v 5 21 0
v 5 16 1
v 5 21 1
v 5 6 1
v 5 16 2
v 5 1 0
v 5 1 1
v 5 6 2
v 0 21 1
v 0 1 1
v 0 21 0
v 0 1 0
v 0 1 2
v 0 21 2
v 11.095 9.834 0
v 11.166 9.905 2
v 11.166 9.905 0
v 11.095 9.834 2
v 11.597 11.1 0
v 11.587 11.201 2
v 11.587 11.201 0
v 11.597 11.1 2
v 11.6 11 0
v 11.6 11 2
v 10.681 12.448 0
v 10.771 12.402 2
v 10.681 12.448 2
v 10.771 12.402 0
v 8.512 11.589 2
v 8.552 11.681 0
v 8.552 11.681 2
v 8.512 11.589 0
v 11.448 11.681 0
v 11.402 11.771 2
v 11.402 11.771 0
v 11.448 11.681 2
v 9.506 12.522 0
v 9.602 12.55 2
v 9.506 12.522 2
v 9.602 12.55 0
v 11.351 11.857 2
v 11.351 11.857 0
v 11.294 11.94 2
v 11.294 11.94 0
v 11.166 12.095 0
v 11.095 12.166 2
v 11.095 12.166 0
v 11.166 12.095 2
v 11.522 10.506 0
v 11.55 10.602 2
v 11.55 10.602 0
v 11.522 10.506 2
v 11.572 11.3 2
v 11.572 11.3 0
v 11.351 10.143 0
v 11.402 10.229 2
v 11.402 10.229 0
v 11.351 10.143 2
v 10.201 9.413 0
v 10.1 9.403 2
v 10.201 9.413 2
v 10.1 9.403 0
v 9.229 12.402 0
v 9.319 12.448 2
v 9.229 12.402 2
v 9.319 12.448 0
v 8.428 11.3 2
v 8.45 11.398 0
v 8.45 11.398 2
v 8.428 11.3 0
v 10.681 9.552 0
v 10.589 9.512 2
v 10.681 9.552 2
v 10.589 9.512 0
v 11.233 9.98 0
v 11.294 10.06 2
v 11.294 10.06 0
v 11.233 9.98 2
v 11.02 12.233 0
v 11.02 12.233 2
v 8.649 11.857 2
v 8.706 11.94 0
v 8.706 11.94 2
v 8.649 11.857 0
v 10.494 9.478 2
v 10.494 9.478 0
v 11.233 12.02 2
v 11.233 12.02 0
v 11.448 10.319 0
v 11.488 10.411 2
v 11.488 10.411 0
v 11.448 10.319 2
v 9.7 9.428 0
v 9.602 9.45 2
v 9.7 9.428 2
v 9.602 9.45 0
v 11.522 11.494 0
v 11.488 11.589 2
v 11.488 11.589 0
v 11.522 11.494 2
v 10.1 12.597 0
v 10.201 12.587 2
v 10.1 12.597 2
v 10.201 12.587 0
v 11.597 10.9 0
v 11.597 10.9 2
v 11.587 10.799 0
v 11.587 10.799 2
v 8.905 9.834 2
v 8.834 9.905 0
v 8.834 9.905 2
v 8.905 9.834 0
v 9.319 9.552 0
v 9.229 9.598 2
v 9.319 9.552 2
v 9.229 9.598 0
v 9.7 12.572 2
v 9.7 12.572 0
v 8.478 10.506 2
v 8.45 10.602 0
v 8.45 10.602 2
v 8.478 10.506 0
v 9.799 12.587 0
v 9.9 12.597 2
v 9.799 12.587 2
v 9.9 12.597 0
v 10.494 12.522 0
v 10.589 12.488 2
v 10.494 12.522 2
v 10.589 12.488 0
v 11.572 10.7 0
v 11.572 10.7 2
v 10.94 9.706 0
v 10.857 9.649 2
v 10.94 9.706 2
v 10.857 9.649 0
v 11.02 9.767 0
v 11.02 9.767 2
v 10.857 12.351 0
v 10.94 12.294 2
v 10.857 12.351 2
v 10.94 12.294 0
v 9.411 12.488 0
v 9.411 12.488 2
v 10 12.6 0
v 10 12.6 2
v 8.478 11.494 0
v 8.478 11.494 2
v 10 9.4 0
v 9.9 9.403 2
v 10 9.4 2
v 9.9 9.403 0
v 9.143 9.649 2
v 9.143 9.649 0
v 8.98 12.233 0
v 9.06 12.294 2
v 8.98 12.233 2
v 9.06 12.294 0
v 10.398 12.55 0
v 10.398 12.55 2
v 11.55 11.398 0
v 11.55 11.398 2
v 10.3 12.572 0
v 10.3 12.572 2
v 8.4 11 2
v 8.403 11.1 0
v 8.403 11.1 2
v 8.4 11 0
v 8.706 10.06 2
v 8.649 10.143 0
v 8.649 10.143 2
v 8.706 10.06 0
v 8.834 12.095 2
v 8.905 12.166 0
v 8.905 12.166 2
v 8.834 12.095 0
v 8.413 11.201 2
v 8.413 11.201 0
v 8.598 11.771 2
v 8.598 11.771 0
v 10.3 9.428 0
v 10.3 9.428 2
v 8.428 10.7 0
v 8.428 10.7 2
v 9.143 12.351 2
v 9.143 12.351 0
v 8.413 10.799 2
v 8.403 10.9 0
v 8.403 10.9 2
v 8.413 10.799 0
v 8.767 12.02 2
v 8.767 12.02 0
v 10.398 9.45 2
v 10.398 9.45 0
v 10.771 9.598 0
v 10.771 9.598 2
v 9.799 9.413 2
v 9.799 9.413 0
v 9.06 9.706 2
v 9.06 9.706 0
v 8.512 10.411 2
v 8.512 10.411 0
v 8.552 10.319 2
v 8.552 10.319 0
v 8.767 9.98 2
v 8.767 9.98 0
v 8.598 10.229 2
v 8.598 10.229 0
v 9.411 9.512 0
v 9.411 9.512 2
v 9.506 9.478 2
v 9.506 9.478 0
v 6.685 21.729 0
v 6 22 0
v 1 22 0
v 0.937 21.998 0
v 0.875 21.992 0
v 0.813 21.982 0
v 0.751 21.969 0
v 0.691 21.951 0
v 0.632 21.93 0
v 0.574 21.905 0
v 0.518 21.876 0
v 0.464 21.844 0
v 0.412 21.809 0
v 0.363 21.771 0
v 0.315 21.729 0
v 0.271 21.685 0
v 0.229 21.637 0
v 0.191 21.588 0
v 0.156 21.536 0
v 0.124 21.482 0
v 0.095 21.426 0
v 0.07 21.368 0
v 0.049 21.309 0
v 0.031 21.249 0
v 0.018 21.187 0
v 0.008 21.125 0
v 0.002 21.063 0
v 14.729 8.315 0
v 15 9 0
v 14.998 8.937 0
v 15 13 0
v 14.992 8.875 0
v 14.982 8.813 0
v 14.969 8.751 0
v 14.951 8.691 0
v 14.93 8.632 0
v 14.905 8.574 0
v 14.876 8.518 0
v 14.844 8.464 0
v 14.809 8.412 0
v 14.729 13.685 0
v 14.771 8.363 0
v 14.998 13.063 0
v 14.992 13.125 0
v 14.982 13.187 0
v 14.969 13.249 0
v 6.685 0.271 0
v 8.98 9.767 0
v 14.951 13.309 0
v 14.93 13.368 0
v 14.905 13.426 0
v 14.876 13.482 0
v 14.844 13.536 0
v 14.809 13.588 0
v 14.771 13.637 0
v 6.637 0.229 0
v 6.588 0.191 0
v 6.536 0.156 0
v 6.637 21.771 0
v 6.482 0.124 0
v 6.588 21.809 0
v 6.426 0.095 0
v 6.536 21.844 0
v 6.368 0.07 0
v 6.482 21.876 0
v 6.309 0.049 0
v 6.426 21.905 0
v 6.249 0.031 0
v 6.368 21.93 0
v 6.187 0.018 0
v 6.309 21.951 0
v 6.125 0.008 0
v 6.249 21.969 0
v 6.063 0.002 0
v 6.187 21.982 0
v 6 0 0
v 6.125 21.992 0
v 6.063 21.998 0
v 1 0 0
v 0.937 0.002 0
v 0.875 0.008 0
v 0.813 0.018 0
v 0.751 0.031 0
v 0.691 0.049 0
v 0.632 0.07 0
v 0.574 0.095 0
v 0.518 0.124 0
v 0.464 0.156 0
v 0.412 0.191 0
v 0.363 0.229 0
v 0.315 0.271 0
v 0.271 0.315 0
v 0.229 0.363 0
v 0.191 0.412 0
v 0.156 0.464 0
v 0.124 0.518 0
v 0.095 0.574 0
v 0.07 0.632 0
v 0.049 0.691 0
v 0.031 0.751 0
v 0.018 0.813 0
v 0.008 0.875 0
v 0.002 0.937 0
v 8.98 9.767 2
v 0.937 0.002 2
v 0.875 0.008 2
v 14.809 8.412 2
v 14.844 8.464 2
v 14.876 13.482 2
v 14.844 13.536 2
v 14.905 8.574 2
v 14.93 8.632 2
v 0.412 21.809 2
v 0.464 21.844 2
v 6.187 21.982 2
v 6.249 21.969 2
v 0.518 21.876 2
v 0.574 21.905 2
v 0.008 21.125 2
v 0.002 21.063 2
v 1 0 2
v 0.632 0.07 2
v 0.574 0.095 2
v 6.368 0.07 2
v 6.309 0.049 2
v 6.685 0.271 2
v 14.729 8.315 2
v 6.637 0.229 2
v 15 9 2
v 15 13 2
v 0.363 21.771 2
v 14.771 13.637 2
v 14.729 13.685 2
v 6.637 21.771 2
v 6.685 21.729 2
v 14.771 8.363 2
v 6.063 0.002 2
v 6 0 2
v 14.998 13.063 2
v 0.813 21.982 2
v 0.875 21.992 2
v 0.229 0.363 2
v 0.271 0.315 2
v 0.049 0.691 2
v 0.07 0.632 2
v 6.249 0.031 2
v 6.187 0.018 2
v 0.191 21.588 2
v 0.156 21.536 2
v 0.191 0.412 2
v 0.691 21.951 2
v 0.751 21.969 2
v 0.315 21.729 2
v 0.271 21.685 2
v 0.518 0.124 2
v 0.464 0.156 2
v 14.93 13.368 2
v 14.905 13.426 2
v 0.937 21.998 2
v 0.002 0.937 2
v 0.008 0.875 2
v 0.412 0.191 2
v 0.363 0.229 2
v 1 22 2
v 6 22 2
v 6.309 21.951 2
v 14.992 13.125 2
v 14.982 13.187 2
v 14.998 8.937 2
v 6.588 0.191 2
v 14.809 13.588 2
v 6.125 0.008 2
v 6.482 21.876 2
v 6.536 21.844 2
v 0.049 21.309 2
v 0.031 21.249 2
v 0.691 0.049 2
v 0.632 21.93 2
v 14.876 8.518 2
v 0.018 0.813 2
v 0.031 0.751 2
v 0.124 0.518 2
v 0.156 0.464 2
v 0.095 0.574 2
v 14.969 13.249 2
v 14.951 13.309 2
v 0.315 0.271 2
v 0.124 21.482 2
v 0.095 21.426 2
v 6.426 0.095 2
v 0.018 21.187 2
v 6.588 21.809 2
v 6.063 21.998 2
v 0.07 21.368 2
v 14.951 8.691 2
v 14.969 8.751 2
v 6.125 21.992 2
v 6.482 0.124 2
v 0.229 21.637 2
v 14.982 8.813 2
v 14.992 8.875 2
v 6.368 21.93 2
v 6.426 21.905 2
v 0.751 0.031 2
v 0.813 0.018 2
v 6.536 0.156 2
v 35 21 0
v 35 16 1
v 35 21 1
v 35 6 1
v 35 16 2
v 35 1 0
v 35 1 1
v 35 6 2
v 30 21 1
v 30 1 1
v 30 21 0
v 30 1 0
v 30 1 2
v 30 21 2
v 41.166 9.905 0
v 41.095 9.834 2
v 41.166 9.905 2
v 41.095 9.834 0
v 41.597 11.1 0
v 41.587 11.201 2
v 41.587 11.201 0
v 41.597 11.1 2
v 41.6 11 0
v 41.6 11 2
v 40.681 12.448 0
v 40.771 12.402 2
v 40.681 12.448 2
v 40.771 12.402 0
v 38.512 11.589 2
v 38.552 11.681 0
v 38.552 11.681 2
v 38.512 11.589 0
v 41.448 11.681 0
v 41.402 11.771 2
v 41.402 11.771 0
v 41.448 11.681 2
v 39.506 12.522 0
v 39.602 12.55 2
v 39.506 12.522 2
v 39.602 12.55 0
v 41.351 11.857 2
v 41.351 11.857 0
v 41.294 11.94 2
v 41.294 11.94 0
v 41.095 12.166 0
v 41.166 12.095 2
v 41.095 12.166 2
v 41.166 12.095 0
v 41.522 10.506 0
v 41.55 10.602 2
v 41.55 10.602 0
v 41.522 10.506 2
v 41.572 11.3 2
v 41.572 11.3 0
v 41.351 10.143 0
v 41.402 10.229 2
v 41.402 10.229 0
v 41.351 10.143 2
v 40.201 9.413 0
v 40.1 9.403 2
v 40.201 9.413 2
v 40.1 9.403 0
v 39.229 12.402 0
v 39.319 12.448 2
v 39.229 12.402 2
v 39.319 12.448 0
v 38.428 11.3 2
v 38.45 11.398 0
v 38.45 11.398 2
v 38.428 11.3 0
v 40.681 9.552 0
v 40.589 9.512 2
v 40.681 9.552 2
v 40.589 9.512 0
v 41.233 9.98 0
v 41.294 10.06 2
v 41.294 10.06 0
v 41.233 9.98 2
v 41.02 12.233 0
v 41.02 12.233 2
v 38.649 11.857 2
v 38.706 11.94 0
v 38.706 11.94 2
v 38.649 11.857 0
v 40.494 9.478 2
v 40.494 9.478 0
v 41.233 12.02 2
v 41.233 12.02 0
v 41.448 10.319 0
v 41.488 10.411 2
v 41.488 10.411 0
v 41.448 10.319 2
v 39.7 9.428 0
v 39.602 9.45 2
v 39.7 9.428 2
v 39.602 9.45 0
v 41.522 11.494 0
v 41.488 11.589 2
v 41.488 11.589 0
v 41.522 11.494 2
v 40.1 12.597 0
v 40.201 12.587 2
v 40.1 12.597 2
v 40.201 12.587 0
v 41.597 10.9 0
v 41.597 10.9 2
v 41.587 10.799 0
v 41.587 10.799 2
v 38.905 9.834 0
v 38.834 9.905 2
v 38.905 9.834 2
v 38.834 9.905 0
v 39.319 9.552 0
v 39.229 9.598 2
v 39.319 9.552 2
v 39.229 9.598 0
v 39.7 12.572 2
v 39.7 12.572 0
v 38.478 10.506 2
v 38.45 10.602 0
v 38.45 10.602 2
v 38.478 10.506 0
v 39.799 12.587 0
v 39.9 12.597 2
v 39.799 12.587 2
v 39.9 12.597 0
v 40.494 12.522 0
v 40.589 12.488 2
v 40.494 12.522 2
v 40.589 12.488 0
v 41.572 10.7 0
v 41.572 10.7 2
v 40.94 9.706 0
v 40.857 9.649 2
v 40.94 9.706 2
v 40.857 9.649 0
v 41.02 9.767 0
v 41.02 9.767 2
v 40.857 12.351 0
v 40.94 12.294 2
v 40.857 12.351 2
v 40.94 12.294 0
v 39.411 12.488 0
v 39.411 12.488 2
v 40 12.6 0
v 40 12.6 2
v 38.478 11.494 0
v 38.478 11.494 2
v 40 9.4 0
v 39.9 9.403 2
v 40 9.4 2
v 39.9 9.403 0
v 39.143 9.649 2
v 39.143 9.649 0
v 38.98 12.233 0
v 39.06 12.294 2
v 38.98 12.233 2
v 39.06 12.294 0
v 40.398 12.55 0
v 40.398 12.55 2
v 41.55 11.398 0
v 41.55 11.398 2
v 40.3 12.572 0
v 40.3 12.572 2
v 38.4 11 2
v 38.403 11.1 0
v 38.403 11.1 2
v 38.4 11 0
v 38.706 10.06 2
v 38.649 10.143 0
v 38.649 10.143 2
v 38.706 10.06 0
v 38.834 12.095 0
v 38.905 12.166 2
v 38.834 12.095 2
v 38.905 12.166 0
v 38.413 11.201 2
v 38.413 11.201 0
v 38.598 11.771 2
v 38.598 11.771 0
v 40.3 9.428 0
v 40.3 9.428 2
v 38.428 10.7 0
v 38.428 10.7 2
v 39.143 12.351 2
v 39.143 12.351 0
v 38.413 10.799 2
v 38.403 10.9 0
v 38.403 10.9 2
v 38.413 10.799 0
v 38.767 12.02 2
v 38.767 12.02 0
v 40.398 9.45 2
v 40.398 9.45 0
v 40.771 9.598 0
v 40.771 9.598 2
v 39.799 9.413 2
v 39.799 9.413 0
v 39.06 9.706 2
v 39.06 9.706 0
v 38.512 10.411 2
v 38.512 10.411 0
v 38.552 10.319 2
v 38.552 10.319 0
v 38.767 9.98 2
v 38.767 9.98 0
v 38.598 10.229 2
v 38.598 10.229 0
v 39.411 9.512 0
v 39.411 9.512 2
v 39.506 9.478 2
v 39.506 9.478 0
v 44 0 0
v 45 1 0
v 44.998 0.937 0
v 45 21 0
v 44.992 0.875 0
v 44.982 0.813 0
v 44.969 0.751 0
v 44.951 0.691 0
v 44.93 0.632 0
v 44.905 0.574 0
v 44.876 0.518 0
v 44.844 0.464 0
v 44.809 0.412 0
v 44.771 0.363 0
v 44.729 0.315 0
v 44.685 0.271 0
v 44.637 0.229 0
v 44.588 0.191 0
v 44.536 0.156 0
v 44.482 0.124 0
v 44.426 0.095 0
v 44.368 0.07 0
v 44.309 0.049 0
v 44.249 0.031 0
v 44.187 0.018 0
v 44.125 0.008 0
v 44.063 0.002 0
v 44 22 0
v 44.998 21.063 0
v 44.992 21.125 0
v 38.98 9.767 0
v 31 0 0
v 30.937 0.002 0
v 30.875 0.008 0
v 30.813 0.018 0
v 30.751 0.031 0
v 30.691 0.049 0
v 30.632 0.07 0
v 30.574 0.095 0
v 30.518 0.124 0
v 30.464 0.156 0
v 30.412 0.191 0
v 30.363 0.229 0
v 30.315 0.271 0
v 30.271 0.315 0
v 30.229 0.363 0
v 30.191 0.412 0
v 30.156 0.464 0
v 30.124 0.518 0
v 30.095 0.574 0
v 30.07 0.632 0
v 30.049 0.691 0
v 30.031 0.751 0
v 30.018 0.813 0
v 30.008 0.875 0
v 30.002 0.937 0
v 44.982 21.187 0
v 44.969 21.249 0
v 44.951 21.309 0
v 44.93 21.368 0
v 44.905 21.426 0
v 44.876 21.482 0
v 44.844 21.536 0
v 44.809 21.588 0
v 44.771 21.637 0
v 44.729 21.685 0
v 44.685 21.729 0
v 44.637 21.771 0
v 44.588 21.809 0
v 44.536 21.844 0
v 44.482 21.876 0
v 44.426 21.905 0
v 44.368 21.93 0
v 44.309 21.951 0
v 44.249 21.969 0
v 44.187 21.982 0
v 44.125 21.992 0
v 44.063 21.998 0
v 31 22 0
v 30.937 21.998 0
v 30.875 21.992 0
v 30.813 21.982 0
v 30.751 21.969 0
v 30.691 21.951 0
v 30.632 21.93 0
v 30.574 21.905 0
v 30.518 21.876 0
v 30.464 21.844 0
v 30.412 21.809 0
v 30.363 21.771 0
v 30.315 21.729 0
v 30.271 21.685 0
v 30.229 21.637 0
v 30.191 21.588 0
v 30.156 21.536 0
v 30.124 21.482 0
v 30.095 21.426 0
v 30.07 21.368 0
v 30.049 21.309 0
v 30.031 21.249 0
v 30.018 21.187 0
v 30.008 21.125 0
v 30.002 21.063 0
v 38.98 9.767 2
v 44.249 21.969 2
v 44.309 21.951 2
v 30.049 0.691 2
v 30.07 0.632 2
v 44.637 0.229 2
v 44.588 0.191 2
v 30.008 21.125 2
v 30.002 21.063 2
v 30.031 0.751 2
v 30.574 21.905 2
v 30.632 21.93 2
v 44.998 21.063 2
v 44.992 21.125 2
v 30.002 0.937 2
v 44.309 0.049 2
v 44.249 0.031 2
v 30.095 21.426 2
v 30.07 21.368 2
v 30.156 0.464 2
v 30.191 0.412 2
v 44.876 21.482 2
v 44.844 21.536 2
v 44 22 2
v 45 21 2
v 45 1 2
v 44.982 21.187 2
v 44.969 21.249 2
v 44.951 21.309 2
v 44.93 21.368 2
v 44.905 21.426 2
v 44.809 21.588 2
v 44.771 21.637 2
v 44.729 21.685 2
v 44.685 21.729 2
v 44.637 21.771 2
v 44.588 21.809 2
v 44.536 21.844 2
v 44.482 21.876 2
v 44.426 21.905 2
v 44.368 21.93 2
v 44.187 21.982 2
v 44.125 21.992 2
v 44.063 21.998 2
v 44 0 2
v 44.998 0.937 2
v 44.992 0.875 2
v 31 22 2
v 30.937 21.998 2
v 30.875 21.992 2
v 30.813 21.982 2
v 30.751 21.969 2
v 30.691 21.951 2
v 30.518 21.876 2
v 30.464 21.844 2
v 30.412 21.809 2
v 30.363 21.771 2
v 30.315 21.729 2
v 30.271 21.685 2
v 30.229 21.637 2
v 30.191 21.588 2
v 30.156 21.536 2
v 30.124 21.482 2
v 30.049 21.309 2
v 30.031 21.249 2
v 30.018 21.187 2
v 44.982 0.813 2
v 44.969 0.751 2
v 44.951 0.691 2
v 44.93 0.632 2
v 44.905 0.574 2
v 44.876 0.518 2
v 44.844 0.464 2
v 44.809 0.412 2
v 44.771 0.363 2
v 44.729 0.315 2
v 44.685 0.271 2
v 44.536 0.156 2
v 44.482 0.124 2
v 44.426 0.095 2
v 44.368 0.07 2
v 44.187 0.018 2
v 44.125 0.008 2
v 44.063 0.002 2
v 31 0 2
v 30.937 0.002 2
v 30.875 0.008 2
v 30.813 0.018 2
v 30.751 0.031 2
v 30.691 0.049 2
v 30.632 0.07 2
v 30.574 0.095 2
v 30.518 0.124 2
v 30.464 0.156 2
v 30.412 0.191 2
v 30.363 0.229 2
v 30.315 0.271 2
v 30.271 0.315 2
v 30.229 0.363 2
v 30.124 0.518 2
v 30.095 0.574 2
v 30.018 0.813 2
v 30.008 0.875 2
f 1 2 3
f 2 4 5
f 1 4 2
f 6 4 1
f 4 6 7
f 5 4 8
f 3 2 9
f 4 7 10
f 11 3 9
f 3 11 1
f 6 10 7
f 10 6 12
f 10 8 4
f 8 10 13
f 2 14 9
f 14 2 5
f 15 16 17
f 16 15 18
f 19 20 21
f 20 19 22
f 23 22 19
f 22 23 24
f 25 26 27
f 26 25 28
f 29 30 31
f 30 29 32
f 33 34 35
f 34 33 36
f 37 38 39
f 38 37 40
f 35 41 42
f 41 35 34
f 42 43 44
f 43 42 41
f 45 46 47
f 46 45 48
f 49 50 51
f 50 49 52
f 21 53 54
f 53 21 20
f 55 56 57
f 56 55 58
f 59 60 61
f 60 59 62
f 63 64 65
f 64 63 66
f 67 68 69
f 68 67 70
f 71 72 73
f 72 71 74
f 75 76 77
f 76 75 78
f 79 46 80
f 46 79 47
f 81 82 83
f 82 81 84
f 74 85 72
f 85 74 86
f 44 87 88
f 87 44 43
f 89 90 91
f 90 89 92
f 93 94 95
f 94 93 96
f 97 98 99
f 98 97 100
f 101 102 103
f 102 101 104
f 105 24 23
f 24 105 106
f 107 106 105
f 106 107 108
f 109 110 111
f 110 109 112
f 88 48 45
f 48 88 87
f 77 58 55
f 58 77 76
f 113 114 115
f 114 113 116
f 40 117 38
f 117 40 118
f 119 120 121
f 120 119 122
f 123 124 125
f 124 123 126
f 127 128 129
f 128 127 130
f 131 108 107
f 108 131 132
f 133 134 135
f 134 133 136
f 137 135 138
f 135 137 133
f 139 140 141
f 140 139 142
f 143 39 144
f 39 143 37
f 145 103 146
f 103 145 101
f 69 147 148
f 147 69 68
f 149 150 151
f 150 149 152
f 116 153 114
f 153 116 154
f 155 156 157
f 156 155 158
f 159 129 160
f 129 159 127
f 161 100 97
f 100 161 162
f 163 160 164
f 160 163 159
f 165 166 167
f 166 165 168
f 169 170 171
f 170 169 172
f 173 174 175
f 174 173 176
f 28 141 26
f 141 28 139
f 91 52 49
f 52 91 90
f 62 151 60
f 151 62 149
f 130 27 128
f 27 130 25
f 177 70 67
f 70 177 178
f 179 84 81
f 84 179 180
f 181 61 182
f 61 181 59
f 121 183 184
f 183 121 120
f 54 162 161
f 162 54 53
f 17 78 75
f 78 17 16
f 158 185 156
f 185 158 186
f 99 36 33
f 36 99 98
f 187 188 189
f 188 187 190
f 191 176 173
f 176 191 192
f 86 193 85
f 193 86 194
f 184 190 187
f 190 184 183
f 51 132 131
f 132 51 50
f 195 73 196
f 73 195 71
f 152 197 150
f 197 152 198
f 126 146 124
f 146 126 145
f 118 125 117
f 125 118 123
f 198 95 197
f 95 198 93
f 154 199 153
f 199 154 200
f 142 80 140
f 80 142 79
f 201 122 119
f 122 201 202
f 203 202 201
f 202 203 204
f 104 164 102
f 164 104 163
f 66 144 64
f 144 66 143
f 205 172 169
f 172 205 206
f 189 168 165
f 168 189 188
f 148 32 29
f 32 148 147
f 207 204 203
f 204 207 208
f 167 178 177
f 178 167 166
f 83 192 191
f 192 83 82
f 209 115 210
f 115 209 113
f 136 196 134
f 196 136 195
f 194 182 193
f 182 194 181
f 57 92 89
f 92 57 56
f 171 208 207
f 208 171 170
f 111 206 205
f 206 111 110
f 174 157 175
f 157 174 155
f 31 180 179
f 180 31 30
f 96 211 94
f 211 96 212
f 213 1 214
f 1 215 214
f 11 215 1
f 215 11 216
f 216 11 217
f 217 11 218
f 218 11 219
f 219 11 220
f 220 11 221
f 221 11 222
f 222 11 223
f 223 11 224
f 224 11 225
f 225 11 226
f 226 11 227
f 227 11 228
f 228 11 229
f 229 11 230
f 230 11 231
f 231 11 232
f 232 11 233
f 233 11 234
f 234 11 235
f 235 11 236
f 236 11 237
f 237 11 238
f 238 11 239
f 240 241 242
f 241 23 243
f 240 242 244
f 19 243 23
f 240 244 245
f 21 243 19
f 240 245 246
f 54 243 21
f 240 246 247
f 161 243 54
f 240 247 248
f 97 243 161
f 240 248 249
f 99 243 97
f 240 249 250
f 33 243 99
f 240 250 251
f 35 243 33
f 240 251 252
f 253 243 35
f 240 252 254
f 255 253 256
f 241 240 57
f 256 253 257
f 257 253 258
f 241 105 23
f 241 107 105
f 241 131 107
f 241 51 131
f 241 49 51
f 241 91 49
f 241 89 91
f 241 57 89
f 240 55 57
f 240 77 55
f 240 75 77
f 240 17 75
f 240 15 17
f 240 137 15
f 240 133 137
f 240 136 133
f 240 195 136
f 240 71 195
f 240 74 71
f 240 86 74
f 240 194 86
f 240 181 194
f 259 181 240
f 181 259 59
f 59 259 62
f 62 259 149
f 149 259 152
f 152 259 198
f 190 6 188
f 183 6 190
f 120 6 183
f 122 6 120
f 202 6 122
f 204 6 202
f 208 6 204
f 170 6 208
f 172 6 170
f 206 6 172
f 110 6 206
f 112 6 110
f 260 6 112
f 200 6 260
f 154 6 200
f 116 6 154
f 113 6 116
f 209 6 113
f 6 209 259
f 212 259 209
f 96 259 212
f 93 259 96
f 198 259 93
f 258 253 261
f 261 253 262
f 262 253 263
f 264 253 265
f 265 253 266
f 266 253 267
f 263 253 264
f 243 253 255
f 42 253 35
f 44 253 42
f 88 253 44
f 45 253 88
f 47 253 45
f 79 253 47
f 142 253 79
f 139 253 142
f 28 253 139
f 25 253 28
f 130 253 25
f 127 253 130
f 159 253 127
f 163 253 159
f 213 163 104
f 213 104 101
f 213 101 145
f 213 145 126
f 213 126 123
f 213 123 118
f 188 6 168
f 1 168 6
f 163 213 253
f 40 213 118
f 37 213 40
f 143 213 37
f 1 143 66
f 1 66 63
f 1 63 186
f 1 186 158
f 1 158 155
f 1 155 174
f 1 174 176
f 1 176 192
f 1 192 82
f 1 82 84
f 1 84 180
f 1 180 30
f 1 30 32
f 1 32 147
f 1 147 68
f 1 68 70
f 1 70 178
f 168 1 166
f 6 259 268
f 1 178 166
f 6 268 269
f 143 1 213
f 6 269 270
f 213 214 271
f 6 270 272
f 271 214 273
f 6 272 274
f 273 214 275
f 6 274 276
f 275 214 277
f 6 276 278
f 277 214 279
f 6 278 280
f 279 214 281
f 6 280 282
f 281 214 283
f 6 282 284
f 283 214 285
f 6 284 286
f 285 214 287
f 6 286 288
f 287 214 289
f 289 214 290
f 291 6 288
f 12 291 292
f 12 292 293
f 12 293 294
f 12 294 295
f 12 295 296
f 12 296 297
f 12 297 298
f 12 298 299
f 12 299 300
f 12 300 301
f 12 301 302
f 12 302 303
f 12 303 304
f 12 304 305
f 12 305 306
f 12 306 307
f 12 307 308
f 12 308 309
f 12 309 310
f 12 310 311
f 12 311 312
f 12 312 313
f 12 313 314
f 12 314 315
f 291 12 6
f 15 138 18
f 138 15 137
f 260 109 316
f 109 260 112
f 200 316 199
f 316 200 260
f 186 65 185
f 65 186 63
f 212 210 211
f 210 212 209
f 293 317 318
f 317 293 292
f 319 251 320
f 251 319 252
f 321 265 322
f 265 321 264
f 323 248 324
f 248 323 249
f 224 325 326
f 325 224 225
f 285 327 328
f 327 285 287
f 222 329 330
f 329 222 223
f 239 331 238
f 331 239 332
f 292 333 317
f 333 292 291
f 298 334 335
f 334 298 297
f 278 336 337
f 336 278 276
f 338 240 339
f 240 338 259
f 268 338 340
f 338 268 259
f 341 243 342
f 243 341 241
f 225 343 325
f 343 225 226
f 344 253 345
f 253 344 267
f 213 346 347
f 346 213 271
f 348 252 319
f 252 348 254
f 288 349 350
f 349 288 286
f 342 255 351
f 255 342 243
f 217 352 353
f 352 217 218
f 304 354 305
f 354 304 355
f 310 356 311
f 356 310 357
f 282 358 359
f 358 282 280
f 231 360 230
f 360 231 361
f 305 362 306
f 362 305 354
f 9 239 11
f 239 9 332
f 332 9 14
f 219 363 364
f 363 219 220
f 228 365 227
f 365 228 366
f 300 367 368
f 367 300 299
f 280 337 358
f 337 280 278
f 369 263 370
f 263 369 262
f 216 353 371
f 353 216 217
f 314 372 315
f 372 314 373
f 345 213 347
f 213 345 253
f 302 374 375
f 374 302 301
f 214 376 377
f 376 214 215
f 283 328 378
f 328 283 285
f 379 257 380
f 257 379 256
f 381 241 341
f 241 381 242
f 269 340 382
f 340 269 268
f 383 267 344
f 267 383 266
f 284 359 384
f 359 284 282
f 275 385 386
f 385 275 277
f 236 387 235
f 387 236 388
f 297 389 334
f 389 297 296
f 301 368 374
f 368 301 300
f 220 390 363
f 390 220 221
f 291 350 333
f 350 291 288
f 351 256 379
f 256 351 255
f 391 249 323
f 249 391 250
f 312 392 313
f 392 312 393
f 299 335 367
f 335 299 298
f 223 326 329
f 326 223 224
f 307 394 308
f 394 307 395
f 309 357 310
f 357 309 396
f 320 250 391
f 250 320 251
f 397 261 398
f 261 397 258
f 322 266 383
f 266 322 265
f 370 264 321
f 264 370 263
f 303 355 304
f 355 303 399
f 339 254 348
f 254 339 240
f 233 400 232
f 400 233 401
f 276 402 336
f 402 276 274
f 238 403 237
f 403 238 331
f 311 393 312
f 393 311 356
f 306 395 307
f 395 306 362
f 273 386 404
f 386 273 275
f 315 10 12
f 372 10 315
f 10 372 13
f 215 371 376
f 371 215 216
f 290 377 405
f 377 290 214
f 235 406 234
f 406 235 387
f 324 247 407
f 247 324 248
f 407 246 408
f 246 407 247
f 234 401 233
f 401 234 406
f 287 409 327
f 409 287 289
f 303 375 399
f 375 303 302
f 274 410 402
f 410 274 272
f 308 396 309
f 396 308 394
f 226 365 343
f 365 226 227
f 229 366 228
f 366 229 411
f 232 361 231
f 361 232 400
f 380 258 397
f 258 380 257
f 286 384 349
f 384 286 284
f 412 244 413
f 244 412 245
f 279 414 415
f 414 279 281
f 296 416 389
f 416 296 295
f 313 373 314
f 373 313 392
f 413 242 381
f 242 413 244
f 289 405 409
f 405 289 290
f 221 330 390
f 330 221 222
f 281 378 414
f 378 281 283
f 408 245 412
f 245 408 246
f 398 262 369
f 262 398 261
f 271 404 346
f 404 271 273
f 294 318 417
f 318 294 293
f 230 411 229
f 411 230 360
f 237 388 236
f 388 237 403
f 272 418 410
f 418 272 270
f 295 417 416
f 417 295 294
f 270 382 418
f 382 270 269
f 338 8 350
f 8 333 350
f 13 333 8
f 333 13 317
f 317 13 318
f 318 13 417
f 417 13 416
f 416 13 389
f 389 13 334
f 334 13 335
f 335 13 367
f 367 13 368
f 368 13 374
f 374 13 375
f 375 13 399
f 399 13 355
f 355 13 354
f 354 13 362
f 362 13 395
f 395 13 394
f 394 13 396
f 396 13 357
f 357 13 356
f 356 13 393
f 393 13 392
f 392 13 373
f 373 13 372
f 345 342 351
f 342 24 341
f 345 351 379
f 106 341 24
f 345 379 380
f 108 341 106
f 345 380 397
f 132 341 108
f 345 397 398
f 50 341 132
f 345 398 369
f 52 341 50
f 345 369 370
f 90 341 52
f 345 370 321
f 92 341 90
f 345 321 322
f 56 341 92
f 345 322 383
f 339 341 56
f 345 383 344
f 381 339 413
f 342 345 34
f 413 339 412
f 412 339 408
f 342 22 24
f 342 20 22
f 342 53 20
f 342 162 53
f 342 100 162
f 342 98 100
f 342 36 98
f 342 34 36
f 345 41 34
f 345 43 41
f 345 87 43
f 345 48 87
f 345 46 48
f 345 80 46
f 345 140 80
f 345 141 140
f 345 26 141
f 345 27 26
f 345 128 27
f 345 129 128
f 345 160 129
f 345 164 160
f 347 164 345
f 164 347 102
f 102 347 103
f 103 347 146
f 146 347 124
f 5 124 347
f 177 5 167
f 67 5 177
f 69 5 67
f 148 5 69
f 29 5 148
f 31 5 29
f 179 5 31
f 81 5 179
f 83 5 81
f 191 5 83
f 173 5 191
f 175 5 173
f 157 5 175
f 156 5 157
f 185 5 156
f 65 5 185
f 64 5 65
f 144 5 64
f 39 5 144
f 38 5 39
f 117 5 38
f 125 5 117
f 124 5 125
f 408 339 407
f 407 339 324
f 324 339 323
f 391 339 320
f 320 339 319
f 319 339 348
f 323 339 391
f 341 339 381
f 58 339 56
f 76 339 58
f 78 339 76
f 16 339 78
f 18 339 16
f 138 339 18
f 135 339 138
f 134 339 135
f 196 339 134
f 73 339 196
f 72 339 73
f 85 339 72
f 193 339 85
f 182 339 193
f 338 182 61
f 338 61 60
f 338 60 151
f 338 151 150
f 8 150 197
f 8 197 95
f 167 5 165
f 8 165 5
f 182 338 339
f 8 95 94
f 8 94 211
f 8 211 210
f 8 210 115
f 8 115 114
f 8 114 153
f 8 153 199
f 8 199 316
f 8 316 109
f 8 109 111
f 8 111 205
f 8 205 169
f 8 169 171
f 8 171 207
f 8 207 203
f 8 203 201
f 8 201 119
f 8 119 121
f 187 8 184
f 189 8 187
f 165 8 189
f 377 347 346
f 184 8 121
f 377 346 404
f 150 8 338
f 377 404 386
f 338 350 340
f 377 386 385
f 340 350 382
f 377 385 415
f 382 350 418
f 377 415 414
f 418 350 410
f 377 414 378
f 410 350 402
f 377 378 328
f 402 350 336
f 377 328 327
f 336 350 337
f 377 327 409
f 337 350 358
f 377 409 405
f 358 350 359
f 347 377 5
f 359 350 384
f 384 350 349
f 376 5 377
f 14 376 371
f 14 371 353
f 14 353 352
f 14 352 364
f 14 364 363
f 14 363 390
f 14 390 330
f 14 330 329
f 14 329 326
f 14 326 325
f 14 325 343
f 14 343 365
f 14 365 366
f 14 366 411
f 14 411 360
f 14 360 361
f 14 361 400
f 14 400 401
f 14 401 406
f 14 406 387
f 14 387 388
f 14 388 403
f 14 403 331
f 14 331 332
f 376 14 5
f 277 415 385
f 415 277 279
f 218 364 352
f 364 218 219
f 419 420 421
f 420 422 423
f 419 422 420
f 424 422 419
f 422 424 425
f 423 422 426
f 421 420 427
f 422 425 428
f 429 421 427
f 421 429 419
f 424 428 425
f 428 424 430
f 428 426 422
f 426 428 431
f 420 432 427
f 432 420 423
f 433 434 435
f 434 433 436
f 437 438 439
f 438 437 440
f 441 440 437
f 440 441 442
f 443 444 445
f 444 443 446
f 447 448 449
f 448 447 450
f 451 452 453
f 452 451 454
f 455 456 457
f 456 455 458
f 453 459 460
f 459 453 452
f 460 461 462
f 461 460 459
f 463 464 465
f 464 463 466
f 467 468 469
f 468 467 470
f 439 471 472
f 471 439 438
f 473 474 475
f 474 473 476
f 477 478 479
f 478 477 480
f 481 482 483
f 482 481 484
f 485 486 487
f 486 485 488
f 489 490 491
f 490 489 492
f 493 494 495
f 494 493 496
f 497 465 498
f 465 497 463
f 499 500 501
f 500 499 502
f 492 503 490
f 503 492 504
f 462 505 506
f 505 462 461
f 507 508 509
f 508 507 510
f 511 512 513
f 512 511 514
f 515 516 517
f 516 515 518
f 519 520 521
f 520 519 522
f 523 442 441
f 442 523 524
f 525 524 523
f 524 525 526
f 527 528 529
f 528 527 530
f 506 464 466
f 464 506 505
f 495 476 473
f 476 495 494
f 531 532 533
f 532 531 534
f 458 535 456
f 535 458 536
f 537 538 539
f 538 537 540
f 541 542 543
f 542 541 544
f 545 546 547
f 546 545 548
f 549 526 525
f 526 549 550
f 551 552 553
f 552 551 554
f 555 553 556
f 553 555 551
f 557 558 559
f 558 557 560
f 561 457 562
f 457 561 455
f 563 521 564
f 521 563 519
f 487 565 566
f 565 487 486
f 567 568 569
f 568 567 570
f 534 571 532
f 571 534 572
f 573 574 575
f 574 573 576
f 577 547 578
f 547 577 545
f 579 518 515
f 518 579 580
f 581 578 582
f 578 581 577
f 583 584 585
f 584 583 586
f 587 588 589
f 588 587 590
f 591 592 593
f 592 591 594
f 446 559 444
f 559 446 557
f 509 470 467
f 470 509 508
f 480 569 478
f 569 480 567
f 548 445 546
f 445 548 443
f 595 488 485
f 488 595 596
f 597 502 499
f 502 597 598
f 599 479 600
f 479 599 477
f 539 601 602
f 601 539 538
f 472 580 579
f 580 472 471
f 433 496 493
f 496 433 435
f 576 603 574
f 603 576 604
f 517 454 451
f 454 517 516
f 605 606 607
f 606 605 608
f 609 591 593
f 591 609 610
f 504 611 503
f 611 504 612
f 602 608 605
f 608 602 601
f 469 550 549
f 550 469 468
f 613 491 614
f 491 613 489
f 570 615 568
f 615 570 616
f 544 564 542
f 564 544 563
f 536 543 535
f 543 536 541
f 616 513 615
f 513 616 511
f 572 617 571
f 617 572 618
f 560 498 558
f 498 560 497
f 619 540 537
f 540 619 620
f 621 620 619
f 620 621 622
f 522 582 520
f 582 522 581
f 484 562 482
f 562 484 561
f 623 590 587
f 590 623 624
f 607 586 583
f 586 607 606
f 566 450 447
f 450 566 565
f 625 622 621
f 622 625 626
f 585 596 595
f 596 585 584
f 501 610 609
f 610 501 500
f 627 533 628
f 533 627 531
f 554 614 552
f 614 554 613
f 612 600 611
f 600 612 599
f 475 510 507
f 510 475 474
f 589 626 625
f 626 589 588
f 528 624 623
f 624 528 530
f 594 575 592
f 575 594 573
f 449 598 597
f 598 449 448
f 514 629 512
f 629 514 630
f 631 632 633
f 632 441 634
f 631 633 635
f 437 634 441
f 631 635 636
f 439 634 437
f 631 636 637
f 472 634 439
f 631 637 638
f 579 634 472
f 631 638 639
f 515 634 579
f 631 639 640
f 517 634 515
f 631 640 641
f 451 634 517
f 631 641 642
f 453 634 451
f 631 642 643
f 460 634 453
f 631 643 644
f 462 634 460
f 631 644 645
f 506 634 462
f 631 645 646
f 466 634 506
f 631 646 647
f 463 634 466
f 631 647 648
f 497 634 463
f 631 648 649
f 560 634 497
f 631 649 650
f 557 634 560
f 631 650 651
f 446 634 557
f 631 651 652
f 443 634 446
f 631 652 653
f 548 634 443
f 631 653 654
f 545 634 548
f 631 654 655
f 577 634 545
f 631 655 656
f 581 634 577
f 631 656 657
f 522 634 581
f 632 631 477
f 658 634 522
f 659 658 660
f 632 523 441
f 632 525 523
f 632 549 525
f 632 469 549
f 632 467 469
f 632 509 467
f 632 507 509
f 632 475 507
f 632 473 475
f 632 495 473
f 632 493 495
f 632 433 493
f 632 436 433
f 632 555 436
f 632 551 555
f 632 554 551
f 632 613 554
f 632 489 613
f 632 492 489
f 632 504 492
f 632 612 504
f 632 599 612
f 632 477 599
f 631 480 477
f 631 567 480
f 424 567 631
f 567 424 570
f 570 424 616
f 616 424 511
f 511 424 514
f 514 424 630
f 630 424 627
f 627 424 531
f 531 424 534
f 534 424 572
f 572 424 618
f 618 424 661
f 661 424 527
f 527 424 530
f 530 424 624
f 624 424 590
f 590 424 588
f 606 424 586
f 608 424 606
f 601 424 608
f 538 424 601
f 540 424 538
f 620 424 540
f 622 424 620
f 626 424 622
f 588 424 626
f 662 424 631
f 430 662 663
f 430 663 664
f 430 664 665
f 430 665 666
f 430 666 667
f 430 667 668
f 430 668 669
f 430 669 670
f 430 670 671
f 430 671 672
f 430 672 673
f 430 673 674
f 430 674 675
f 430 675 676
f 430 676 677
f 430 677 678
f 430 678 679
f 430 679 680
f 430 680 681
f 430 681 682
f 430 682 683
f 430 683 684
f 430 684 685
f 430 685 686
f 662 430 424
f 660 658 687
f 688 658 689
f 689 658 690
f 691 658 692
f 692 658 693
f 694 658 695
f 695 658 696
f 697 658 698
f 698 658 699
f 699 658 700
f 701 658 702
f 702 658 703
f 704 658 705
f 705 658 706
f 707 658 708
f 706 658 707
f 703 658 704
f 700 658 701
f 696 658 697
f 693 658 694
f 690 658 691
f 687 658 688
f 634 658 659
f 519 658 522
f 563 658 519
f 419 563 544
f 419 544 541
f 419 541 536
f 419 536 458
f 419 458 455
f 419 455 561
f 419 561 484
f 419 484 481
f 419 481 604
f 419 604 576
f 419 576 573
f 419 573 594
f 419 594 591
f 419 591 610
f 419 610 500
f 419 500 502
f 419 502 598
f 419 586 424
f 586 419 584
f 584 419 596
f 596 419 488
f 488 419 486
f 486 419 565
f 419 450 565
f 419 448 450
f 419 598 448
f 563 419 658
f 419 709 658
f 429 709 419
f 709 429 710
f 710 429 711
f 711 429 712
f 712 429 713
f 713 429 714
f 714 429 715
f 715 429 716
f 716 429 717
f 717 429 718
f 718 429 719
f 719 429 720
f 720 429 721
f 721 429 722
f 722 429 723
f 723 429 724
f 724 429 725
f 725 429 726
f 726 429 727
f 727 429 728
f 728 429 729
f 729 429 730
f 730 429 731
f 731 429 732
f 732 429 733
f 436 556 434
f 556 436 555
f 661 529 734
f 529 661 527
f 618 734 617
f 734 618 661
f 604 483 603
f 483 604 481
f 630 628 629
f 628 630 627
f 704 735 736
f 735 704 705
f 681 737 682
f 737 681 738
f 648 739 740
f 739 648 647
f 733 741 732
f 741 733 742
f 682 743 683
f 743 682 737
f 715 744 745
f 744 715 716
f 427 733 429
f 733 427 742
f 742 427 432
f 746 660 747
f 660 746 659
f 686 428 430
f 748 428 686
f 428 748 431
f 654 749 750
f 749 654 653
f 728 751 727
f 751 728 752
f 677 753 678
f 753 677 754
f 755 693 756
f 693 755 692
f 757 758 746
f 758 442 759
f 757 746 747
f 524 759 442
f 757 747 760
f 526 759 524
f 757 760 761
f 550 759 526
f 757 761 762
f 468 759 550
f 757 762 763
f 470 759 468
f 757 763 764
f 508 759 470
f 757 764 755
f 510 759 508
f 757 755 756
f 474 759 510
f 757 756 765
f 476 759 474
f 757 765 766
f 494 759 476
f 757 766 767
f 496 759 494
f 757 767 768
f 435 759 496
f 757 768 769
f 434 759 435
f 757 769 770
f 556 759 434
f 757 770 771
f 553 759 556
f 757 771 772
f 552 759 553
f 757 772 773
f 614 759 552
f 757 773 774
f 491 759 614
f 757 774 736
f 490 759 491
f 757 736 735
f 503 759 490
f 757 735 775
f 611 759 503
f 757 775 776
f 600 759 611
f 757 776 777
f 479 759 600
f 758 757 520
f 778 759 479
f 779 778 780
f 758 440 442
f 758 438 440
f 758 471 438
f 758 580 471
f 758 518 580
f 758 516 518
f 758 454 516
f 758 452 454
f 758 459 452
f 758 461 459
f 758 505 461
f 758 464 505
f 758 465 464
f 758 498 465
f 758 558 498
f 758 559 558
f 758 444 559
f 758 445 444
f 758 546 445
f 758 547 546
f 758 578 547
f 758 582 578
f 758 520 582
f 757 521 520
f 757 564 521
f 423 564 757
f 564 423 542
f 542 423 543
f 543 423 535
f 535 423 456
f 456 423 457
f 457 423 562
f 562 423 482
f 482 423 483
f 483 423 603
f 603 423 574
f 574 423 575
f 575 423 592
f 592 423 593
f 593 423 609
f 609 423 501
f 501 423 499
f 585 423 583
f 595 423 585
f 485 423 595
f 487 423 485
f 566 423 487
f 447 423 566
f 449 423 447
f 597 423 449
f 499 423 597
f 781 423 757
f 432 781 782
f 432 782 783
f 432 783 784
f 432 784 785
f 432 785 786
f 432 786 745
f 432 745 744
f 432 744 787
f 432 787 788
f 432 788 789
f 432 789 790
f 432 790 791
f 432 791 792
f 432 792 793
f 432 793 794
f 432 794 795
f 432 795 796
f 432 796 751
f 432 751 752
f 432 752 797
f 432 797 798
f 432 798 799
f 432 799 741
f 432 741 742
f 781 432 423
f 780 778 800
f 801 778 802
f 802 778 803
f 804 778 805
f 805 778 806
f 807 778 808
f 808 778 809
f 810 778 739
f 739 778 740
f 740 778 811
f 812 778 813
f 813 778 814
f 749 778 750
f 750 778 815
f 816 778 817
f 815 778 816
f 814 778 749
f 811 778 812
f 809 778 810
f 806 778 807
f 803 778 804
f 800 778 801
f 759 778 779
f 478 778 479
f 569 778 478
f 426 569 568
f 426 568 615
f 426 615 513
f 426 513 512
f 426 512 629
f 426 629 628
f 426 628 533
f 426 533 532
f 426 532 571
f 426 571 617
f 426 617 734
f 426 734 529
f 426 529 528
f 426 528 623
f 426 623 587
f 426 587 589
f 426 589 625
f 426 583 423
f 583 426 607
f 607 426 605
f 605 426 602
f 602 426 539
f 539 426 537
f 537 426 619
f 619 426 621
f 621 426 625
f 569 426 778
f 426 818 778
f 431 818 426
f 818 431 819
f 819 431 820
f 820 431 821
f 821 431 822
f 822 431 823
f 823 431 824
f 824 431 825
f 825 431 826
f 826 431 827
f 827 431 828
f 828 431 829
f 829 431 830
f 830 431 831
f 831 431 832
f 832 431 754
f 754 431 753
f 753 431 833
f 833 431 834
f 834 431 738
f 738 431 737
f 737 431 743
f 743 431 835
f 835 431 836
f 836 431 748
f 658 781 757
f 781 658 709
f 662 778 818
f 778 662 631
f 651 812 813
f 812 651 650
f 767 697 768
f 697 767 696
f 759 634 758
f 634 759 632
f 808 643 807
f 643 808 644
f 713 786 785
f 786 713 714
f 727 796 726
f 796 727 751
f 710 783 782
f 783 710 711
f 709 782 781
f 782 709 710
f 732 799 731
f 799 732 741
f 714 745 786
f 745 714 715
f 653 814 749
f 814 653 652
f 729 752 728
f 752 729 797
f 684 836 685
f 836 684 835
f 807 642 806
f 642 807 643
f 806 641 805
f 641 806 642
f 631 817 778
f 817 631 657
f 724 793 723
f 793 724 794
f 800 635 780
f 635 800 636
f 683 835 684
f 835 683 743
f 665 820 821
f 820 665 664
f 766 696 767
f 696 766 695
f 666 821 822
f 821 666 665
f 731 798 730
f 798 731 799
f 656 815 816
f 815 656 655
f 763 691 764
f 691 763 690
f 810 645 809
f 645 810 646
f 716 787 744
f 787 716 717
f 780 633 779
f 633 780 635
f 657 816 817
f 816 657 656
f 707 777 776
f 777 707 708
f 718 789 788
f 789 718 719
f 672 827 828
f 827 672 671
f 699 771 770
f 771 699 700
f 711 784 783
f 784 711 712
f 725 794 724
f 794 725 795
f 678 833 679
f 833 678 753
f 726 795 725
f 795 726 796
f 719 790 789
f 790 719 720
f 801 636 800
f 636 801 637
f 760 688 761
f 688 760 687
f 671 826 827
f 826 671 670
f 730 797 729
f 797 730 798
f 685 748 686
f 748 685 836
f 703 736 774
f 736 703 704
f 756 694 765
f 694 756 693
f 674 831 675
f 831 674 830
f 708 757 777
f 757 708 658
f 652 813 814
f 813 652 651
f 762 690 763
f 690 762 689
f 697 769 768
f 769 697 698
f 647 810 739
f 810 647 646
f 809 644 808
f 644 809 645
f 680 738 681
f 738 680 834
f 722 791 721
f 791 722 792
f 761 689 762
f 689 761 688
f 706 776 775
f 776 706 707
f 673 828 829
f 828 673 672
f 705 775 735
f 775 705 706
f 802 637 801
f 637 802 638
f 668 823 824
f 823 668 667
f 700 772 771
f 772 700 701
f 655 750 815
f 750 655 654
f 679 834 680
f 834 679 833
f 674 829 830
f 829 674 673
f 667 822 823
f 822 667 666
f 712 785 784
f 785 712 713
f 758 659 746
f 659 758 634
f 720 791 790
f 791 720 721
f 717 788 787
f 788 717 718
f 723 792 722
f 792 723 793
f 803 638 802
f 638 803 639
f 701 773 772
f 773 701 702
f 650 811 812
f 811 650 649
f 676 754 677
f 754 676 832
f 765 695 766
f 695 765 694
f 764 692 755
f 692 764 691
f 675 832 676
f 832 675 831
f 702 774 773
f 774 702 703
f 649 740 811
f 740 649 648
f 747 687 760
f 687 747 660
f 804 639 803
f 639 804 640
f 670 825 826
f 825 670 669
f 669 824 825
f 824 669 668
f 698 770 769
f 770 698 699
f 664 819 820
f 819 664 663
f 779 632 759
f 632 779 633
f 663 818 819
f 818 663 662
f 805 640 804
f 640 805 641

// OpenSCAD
$fn = 100;

/* for rendering */
extra = 0.1;


clampWall = 1;            // 1mm wall on the sides
clampTopThickness = 1;
serialPlateWidth = 20;    // width of extrusion
serialPlateThickness = 1;

clampPlateX = 5;        // 5mm holding the plate
clampPlateY = 5;        // 10mm free clearance in the middle of the side of the plate (only valid for TYPE2)
clampPlateYinner = 10;  // 10mm free clearance in the middle of the side of the plate
clampX = 10;            // 10mm for rest and screw

screwHoleDia = 3.2;     //M3 screw with 0.2mm extra clearance
minkowskiCylinderR = 1; // roundness

module ldoSerialPlate(type = "DEBUG")
{
  difference() {

    if(type == "TYPE1") {
      /* rectangular clamp */
      translate([minkowskiCylinderR,minkowskiCylinderR,0])
      minkowski() {
        cube([clampPlateX+clampX-minkowskiCylinderR*2,      // x width
          serialPlateWidth+clampWall*2-minkowskiCylinderR*2,
          clampTopThickness+serialPlateThickness]);
        cylinder(r=minkowskiCylinderR, h=0.00000001, center=true);
      }
    } else if (type == "TYPE2") {
      /* edgy type */
      minkowski(){
        translate([minkowskiCylinderR,minkowskiCylinderR,0])
        hull()
        {
          cube([clampPlateX+clampWall*2-minkowskiCylinderR*2,
            serialPlateWidth+clampWall*2-minkowskiCylinderR*2,
            clampTopThickness+serialPlateThickness]);
          translate([clampPlateX+clampX-minkowskiCylinderR*2-extra,(serialPlateWidth-clampPlateY)/2+clampWall/2,0])
            cube([extra,clampPlateY+1-minkowskiCylinderR*2,clampTopThickness+serialPlateThickness]);
        }
        cylinder(r=minkowskiCylinderR, h=0.00000001, center=true);
      }
    }

    if (1) // for debugging
    {
      translate([0,clampWall,-extra])
      cube([clampPlateX,serialPlateWidth,serialPlateThickness+extra]);

      /* top cutout for serial plate (trapezial shape) */
      translate([-extra,clampWall,clampWall])
      hull()
      {
        cube([0.1,serialPlateWidth,serialPlateThickness]);
        translate([clampPlateX,(serialPlateWidth-clampPlateYinner)/2,0]) cube([0.1,clampPlateYinner,1.1]);
      }

      /* screw hole */
      translate([clampPlateX+(clampX/2),(serialPlateWidth+minkowskiCylinderR*2)/2,0])
      cylinder(r=screwHoleDia/2,h=serialPlateThickness+clampTopThickness+extra);
    }
  }
}


ldoSerialPlate("TYPE2");

translate([30,0,0])
ldoSerialPlate("TYPE1");
